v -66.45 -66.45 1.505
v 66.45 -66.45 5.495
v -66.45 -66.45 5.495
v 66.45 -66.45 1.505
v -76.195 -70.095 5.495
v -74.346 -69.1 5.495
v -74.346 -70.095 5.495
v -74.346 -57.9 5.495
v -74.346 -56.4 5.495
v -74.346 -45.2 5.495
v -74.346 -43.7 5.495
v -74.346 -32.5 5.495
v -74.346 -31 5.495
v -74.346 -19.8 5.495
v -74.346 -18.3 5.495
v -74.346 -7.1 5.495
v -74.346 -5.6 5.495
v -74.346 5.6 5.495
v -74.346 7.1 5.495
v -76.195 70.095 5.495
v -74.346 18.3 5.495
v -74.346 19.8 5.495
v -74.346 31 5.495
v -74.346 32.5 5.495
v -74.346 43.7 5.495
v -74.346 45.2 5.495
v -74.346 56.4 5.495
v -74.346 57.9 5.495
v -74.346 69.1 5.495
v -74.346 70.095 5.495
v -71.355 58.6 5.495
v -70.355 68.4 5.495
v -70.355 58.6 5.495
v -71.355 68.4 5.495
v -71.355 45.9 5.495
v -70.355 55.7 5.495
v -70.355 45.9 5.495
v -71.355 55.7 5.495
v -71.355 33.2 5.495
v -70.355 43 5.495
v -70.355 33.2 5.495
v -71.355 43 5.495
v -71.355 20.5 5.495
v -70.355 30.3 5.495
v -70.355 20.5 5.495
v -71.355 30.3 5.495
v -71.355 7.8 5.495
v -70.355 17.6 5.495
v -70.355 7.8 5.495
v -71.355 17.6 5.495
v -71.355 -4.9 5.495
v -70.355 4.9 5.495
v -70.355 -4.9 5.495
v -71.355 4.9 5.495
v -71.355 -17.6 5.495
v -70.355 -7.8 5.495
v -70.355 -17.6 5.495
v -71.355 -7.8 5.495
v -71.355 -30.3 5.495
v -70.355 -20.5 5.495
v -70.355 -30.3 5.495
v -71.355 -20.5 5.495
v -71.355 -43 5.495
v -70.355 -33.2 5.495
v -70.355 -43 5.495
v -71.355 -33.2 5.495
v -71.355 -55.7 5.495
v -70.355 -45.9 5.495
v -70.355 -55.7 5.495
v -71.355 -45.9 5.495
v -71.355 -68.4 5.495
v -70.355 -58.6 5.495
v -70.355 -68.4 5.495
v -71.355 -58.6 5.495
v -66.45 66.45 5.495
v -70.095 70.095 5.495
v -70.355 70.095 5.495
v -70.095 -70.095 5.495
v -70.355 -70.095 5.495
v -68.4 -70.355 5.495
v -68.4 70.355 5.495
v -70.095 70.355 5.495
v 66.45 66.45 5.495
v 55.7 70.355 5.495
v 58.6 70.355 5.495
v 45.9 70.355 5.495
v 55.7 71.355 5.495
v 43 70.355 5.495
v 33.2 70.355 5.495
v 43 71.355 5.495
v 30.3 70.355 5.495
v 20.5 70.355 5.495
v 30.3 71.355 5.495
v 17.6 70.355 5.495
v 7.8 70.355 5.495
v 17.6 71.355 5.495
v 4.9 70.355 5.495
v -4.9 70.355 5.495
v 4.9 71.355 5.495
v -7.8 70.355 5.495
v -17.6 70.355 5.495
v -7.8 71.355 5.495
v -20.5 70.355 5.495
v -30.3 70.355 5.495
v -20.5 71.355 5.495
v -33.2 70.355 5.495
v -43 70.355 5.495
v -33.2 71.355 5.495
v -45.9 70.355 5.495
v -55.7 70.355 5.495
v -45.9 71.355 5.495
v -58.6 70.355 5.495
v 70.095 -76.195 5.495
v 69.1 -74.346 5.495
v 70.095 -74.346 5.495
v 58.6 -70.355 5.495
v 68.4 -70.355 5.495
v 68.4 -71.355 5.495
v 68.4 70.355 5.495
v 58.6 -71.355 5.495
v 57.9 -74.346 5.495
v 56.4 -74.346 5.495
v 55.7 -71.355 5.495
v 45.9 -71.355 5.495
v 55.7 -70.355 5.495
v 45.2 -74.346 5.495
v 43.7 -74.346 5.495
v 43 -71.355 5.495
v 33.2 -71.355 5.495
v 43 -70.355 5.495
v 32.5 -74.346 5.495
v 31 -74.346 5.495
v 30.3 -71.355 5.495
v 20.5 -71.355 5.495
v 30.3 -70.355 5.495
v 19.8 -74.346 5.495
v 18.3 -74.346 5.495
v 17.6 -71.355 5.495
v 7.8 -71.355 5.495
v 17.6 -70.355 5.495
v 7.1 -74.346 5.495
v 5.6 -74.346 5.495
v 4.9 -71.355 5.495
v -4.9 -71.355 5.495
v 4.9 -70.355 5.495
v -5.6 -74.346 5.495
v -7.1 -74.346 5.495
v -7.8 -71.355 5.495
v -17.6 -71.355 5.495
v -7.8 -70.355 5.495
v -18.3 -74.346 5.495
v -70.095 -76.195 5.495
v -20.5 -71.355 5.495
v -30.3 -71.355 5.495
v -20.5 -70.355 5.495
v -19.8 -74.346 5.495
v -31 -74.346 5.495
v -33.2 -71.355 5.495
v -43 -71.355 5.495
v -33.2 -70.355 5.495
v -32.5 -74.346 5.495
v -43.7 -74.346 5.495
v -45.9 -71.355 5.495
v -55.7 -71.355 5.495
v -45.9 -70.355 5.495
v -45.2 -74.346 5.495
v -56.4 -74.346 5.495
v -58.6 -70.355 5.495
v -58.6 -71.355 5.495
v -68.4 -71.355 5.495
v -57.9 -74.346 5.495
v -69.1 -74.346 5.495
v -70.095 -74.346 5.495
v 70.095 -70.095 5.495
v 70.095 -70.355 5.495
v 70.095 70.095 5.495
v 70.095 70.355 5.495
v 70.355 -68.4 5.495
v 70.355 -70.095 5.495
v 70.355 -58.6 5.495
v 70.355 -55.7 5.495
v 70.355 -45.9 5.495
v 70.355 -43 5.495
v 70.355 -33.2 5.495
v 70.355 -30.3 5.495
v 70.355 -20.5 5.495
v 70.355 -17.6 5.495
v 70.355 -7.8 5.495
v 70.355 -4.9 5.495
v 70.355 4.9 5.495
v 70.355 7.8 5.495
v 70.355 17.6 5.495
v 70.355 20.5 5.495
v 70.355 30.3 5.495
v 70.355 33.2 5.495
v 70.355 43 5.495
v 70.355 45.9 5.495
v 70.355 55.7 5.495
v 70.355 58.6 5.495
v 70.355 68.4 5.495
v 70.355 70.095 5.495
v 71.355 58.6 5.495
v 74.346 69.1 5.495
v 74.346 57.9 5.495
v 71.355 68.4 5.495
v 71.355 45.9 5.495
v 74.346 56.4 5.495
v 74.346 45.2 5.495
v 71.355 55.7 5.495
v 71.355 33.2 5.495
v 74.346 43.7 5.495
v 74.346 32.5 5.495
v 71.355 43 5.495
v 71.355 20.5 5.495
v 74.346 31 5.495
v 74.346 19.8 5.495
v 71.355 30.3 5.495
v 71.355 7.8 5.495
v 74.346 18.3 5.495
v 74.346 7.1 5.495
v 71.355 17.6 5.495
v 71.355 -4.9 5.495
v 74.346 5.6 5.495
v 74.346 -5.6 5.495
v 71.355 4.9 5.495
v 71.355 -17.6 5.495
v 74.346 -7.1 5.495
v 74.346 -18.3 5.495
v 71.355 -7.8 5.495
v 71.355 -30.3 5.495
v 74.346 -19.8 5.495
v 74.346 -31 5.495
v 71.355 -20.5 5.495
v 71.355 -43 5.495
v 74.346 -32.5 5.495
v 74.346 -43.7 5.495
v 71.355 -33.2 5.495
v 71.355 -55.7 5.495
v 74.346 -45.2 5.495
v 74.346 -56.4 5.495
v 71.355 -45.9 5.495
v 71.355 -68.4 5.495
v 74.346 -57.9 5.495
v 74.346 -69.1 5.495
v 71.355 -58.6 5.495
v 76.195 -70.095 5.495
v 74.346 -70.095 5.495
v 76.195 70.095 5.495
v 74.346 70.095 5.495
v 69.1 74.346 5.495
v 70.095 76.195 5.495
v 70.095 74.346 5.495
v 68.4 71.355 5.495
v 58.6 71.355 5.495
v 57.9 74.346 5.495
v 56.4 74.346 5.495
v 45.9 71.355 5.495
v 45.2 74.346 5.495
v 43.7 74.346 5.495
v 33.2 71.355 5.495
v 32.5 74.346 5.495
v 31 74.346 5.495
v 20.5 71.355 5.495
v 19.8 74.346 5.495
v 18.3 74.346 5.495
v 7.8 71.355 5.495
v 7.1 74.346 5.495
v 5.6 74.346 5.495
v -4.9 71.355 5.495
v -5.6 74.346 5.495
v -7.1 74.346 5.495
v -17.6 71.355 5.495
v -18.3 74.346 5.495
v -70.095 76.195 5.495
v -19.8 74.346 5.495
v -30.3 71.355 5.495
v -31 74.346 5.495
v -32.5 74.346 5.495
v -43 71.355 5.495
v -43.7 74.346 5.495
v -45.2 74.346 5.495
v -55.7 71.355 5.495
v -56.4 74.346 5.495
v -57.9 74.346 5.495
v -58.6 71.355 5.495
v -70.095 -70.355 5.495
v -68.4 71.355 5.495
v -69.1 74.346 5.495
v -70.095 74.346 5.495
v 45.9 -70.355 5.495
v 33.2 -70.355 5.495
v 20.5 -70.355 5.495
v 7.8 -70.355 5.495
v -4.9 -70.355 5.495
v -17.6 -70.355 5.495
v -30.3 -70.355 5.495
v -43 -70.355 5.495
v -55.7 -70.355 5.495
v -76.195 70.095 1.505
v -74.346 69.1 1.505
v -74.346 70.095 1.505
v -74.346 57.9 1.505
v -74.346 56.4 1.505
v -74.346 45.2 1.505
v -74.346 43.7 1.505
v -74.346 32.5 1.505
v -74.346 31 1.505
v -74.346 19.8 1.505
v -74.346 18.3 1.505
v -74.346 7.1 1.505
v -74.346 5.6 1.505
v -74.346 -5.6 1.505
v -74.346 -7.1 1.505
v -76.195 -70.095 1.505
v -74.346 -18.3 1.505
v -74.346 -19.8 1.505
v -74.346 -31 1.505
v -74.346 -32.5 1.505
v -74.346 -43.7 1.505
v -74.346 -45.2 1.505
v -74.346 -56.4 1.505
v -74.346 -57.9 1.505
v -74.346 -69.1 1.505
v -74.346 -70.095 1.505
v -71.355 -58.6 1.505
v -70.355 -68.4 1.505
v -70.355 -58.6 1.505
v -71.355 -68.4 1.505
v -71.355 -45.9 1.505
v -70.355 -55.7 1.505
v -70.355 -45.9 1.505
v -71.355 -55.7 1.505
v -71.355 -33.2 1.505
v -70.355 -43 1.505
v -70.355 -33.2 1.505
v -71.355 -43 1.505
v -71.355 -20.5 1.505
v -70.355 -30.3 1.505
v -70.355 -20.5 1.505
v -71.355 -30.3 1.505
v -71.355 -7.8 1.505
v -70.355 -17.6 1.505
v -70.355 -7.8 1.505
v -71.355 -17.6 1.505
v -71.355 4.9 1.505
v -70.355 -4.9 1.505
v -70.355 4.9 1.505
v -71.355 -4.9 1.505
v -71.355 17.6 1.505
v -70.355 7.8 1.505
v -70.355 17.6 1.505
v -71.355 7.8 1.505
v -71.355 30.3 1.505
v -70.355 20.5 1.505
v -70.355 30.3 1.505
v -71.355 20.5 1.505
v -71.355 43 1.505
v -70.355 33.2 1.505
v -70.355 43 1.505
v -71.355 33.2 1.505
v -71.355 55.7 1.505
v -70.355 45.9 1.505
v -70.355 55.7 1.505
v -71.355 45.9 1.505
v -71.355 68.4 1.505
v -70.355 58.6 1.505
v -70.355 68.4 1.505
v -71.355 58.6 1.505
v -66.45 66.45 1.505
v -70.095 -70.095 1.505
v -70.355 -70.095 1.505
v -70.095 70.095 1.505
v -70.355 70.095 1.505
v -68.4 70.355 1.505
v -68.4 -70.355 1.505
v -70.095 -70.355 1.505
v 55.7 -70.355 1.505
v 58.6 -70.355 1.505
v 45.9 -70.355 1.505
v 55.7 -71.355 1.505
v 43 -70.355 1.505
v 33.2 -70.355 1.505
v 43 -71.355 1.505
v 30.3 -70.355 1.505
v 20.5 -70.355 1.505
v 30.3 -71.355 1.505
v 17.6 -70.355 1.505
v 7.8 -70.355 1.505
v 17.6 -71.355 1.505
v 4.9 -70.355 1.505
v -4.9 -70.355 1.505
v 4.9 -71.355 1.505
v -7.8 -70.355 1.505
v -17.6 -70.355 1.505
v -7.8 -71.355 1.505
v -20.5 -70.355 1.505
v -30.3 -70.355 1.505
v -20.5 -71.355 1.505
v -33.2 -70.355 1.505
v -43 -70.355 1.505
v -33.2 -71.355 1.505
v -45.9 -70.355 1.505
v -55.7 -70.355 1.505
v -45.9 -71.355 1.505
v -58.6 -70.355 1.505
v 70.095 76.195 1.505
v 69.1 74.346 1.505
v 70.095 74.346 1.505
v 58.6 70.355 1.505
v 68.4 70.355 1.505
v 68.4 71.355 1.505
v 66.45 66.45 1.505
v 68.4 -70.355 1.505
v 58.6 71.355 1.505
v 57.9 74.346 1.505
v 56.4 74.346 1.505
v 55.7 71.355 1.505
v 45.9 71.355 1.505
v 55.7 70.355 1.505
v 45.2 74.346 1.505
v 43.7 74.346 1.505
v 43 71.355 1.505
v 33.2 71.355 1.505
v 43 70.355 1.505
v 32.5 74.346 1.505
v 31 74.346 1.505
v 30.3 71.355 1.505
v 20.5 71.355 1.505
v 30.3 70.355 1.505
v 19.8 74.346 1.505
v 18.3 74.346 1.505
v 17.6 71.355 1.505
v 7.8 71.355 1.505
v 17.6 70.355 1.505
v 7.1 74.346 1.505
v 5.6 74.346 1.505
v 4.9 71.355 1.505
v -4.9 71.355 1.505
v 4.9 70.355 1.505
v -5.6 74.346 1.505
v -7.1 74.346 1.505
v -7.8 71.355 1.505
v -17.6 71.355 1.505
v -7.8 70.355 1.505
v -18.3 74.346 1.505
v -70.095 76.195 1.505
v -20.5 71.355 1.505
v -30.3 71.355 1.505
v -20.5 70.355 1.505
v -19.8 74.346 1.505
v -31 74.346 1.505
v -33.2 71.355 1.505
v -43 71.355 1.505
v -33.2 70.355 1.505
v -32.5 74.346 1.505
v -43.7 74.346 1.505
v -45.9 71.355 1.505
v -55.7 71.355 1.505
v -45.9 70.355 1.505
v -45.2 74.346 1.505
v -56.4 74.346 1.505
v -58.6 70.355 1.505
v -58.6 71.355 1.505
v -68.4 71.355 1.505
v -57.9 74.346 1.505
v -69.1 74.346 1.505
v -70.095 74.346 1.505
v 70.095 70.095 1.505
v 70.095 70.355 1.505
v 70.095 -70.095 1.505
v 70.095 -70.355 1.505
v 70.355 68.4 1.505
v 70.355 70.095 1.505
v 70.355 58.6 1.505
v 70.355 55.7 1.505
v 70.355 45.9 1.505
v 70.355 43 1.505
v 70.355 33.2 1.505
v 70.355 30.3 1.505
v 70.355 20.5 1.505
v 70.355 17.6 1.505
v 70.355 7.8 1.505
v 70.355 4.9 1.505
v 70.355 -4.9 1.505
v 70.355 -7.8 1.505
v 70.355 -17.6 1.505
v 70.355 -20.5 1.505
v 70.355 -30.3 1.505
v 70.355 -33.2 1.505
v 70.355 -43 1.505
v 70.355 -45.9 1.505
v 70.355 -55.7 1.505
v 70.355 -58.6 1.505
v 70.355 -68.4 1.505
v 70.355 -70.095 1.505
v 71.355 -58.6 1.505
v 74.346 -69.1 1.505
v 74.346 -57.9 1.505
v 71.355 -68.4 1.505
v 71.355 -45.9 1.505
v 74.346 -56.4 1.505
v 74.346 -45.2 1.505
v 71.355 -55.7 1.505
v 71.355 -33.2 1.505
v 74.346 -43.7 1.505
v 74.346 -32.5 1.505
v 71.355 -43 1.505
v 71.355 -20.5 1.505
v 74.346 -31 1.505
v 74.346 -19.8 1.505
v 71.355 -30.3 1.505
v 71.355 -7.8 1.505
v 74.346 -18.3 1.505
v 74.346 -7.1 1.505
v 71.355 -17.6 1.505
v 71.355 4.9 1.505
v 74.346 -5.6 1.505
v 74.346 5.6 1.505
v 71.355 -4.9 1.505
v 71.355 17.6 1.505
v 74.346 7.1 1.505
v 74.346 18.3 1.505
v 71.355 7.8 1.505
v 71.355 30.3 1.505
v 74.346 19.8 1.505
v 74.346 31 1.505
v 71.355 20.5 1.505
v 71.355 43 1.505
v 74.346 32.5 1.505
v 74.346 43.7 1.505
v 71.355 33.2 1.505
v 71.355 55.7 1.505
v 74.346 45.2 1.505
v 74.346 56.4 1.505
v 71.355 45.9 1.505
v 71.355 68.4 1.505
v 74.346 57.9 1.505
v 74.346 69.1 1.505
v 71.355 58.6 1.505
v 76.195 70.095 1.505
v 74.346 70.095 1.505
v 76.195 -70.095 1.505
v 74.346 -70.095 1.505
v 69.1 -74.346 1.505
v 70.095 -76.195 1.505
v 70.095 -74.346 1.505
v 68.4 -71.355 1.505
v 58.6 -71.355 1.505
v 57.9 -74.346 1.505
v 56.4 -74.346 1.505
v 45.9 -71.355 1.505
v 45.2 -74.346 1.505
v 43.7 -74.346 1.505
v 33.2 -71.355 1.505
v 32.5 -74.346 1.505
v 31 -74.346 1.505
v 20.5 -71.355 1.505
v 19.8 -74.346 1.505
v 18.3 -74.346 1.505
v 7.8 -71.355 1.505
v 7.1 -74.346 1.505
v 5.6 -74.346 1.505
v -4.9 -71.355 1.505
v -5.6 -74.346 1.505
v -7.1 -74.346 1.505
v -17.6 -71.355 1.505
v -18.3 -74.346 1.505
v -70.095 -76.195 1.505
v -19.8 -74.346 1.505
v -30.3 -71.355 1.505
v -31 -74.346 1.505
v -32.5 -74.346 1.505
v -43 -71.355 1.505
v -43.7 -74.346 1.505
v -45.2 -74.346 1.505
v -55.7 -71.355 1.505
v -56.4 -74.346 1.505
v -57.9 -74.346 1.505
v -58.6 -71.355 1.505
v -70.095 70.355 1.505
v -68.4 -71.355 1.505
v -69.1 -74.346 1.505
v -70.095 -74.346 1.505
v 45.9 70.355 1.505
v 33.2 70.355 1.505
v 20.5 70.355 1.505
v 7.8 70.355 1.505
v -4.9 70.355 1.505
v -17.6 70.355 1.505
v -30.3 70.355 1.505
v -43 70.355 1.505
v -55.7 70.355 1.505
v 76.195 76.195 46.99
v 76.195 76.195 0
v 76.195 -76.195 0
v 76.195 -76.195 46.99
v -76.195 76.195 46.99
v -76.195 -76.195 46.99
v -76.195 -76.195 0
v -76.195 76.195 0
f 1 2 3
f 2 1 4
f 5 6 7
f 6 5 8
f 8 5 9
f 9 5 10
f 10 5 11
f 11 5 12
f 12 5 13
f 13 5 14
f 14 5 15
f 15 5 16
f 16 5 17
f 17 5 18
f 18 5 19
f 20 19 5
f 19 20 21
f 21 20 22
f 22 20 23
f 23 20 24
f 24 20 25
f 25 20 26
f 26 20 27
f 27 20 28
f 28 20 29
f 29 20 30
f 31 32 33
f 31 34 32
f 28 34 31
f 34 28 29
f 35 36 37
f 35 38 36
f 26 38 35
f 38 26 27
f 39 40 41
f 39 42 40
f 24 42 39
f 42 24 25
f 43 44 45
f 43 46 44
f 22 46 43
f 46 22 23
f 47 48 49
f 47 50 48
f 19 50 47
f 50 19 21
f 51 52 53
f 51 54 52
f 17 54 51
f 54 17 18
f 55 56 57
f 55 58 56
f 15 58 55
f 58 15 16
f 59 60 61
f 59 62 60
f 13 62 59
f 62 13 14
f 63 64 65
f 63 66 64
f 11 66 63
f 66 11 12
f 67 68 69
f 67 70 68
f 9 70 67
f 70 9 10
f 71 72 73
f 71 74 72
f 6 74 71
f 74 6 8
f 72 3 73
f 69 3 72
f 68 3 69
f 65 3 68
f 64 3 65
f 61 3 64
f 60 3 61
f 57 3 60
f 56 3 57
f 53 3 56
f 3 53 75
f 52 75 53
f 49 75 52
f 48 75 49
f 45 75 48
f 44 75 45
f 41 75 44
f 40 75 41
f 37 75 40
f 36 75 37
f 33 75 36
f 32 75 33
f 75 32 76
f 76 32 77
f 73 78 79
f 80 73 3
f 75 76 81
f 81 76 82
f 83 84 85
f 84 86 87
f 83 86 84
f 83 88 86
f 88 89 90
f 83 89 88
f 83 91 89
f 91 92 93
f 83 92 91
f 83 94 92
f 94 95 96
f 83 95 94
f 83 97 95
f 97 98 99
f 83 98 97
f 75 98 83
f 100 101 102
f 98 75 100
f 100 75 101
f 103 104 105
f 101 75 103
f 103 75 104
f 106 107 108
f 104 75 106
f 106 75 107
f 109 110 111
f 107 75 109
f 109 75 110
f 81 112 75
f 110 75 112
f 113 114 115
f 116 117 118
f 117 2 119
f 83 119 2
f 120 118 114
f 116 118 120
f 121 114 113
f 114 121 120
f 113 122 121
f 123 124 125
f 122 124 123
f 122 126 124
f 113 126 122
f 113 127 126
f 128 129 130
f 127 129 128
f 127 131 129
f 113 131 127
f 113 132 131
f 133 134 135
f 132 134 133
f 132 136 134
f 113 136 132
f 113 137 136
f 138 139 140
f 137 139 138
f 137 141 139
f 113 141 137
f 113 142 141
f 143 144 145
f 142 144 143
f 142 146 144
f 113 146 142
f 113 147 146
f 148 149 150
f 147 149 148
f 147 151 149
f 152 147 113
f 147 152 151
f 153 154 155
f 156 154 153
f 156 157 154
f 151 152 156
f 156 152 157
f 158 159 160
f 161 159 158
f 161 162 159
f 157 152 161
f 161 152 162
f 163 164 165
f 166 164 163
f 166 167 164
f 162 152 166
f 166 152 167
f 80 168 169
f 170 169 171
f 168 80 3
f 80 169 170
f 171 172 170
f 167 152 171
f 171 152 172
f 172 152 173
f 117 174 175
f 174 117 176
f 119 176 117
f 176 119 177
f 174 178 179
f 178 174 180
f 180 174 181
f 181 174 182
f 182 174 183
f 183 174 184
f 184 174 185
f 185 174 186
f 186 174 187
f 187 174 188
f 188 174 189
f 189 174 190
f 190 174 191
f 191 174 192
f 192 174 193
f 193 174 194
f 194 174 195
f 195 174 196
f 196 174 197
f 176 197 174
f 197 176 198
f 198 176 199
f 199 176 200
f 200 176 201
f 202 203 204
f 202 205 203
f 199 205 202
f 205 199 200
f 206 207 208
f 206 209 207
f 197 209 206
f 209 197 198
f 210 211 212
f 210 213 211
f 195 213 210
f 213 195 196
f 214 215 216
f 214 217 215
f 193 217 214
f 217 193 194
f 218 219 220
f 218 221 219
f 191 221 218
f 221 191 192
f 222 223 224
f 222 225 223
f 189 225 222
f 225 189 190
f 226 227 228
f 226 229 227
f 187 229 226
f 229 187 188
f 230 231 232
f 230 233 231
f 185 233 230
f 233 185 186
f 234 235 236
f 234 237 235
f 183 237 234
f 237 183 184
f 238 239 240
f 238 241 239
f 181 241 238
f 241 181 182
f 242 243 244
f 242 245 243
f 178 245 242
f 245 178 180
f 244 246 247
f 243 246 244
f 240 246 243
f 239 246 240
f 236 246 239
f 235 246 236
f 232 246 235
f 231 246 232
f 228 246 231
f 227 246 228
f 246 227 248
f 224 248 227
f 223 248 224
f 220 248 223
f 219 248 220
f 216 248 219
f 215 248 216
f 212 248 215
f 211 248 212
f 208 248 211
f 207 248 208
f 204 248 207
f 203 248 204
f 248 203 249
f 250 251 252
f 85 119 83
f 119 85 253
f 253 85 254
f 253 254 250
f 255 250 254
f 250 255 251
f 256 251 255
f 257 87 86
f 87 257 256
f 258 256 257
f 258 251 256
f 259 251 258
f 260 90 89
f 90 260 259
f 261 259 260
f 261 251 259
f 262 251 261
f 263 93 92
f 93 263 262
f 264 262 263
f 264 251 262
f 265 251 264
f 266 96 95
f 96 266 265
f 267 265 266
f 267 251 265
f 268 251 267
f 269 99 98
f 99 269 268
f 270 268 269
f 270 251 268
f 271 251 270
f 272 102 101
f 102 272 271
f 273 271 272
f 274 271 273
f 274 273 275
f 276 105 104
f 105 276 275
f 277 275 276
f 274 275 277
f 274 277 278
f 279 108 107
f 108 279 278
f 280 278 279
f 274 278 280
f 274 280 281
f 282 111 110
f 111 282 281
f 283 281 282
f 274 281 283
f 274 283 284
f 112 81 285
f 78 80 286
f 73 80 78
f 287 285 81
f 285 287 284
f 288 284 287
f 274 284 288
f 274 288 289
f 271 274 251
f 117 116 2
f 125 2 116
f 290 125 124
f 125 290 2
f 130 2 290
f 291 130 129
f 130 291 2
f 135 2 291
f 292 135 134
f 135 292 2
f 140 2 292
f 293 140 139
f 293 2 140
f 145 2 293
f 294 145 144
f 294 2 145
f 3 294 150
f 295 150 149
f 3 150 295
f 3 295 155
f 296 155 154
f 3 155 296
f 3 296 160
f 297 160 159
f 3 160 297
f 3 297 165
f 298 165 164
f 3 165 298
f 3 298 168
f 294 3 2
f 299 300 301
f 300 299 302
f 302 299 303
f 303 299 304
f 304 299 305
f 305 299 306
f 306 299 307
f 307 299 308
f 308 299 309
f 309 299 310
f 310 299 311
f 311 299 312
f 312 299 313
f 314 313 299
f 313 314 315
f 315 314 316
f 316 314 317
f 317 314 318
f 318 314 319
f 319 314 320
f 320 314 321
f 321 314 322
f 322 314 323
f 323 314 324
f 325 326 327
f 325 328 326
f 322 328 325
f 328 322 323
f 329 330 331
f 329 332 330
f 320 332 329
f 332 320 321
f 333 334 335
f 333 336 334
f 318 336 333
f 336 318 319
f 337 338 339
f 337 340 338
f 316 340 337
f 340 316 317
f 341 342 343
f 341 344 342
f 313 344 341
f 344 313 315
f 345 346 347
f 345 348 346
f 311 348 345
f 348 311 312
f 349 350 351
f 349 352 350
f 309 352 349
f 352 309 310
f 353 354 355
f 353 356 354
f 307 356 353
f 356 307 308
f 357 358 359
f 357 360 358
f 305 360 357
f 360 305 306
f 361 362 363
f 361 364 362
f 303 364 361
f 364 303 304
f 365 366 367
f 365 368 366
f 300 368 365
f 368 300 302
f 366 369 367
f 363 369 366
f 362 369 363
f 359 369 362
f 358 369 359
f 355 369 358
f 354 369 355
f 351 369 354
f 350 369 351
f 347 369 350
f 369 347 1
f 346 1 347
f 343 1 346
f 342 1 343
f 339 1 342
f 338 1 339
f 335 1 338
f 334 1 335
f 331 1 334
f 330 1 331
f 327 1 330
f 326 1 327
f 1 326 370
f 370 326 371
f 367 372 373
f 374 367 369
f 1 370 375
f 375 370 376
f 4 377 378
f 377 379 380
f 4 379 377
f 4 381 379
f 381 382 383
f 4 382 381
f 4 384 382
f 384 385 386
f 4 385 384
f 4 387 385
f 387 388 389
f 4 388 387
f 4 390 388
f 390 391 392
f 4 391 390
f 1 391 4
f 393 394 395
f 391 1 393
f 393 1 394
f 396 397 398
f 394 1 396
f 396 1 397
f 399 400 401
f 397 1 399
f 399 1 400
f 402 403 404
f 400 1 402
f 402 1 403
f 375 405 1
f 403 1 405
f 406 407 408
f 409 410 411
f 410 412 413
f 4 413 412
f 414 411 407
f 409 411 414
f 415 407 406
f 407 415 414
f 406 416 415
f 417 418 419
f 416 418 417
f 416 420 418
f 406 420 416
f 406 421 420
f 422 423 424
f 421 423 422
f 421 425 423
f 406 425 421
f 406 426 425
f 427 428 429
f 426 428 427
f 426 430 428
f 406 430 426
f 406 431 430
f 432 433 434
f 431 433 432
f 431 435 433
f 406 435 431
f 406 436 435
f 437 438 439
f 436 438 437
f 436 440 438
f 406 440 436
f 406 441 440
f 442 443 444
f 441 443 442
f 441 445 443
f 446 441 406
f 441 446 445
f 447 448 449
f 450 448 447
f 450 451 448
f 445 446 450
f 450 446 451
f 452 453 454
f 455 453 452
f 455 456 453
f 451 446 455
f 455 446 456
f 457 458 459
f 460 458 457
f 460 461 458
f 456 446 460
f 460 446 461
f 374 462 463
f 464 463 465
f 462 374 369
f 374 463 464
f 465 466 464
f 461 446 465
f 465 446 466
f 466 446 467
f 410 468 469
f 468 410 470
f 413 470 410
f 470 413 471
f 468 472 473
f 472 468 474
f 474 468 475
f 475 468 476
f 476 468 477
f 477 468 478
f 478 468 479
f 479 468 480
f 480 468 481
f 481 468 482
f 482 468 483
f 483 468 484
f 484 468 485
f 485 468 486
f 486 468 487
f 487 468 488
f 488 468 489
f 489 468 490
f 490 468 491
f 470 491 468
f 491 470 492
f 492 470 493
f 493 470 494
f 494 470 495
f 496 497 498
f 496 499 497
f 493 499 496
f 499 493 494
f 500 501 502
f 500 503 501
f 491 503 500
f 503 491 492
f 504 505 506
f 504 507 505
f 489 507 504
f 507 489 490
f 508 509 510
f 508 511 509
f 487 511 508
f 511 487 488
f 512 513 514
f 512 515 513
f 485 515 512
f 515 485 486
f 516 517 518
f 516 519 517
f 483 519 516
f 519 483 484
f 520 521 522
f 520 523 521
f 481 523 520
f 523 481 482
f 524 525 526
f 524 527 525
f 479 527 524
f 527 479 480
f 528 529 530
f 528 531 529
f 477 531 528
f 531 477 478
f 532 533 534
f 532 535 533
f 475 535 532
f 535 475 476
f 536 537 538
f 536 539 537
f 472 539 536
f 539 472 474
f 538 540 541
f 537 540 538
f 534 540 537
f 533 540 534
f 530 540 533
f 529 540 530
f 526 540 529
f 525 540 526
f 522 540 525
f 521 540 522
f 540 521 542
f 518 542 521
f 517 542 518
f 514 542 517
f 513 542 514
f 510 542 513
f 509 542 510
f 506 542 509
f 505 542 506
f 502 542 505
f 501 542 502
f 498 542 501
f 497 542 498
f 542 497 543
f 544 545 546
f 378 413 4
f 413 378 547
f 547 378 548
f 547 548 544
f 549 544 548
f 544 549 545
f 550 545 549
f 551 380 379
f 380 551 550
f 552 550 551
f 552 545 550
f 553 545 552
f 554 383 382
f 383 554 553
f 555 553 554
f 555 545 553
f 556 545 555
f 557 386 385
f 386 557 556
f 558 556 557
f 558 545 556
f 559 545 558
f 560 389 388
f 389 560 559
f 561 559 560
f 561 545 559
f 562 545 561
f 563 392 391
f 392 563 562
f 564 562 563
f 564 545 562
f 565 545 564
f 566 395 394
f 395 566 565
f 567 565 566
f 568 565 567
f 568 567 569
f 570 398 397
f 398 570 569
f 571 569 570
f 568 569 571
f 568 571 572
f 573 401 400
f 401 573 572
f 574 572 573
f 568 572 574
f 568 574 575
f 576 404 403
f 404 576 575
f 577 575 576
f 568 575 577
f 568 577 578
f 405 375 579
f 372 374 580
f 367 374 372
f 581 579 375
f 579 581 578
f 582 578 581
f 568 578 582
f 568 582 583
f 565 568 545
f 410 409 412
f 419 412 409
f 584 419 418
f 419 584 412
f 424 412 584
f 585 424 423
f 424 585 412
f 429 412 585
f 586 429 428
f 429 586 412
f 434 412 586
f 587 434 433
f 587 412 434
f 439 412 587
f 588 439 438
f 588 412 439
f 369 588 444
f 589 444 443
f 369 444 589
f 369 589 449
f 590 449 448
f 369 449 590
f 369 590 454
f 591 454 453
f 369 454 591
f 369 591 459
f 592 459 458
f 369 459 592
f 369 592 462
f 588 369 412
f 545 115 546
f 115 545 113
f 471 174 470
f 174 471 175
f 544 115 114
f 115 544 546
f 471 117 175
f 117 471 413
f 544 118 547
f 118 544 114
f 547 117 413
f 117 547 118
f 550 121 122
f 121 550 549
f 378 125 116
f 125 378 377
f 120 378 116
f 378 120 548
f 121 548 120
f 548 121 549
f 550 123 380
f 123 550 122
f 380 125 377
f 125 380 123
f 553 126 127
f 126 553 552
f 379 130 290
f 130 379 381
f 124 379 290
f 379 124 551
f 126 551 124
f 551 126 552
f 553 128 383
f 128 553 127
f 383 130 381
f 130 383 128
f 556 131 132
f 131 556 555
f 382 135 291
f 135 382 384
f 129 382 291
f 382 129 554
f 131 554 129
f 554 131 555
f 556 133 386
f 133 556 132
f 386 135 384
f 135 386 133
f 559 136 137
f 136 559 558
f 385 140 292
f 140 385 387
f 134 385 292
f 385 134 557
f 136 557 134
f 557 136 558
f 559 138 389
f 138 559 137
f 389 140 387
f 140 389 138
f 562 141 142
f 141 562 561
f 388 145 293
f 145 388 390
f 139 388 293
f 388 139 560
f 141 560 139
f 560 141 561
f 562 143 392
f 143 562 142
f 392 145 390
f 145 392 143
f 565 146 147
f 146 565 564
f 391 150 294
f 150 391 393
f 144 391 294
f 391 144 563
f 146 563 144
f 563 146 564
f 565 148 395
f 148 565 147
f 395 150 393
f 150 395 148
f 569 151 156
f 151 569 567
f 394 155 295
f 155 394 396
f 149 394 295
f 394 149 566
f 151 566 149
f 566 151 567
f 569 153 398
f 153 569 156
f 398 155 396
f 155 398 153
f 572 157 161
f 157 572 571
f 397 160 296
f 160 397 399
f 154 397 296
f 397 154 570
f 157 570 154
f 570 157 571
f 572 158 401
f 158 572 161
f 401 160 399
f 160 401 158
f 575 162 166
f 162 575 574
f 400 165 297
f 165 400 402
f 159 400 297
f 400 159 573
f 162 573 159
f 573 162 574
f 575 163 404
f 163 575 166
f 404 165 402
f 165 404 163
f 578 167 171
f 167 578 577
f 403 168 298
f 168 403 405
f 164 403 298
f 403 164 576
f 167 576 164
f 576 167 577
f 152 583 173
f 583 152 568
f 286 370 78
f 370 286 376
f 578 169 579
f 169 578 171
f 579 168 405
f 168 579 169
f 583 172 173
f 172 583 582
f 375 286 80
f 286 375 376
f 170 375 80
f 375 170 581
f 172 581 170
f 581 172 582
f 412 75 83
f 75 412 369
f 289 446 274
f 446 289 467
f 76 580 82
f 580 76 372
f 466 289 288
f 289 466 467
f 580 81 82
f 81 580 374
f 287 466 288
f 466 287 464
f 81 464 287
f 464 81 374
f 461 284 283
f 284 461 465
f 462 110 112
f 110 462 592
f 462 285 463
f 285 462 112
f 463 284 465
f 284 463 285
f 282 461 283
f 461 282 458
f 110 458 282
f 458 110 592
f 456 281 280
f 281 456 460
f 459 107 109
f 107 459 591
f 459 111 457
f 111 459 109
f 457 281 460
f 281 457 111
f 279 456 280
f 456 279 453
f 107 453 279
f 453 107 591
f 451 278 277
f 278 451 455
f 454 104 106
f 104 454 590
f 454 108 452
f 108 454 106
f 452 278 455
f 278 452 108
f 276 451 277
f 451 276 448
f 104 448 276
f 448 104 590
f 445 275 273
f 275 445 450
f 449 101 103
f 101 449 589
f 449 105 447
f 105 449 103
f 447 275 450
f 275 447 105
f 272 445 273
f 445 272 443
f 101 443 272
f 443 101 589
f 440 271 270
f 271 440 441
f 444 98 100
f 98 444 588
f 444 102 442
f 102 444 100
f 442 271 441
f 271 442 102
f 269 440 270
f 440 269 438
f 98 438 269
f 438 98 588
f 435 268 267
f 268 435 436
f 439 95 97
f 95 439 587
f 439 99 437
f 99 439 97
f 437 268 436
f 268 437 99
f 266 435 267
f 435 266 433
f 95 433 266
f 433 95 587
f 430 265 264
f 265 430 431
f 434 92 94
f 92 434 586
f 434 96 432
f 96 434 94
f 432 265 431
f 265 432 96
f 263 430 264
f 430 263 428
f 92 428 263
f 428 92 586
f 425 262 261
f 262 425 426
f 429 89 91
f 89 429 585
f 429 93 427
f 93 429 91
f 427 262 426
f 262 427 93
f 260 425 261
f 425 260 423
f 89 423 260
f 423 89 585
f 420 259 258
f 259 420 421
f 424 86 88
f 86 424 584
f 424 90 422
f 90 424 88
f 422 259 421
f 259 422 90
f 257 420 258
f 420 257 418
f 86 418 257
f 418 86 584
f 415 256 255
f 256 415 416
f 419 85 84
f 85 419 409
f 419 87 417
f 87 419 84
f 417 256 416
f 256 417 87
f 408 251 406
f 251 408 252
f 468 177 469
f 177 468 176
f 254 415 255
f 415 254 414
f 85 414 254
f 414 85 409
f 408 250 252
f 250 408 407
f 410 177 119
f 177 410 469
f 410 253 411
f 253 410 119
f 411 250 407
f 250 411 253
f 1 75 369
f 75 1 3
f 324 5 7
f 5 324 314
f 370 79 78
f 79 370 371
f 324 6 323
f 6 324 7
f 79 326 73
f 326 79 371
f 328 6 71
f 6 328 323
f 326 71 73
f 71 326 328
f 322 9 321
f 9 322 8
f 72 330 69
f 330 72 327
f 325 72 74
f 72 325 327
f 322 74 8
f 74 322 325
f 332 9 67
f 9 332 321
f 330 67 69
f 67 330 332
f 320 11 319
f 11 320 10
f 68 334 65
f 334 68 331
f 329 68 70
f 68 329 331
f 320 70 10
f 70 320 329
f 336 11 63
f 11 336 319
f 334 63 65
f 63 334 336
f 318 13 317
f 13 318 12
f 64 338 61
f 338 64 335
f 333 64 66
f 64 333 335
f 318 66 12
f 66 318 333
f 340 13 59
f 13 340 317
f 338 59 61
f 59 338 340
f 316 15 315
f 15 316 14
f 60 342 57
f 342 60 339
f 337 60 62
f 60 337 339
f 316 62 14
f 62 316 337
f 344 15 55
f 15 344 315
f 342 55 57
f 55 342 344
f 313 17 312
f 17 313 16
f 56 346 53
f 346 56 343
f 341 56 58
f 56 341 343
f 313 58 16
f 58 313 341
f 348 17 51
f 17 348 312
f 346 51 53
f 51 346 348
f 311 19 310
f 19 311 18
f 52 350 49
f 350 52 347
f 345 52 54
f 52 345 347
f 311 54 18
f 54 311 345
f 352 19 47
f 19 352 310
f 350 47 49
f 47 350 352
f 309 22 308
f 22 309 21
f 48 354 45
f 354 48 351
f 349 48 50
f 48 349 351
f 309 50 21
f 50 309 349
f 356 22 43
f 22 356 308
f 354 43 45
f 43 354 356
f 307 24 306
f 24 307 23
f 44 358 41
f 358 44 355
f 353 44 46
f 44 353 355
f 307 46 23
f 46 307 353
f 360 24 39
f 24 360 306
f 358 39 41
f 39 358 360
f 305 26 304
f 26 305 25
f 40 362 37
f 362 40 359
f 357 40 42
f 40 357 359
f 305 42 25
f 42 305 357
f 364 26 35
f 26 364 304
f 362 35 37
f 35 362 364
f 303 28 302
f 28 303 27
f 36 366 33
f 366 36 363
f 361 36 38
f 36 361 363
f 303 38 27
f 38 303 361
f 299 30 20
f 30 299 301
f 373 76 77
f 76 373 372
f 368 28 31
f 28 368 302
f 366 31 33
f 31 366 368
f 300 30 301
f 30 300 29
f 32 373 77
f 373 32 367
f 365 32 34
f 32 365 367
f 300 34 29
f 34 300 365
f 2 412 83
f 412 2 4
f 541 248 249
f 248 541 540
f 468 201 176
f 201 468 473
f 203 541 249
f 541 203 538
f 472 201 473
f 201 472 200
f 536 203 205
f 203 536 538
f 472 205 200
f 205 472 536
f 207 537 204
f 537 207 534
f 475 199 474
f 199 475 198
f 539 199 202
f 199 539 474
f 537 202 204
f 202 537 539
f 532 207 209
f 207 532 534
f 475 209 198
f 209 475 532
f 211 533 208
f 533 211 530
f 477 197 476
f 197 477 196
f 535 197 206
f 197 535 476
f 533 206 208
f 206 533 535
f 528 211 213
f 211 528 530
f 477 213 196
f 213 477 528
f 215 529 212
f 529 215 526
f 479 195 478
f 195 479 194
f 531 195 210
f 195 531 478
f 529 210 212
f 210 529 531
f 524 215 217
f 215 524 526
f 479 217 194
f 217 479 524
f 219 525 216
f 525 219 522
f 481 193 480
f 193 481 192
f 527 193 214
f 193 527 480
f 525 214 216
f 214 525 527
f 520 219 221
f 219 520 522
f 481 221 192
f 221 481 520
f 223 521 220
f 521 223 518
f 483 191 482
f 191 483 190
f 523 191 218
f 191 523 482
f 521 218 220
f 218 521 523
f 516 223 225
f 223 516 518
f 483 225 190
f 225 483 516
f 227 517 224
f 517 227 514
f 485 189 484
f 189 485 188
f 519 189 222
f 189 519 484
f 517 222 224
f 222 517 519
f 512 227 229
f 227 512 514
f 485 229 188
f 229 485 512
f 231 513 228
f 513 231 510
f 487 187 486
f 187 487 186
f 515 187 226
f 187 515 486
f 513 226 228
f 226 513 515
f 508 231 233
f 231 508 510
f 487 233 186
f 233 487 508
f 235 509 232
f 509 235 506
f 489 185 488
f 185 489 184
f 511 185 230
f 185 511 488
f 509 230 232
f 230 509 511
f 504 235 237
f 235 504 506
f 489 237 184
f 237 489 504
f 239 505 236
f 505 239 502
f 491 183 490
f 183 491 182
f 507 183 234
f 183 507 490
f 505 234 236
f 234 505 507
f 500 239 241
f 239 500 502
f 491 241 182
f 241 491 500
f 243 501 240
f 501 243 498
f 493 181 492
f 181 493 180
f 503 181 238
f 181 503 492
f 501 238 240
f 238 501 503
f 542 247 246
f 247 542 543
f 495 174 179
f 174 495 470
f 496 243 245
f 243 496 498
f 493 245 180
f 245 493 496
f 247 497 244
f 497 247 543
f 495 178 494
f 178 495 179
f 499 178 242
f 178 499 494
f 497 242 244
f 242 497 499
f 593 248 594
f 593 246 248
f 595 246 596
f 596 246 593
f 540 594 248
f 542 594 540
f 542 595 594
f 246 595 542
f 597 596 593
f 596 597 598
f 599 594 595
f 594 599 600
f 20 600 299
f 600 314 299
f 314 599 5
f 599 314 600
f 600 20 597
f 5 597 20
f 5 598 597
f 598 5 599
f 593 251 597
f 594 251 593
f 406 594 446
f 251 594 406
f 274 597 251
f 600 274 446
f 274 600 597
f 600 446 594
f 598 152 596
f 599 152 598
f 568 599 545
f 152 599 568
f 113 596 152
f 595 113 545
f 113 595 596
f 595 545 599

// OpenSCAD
// file: openlock_port.scad
include <consts.scad>

module port() {
    // all units are in mm (yes, this is a *special* case for this project)
    depth = 4;
    width = 9.75;
    collar_width = 1.8545;
    collar_indent = 1;
    height = 13.2;
    notch_width = 5.8445;
    notch_height = 9.80;
    notch_offset = (height - notch_height) / 2;
    notch_rest = 1;
    // offset hack - adds tolerance for preview/render
    eps = 0.01;
    eps_half = eps / 2;
    
    translate([0, -height / 2, -depth / 2])
        difference() {
            translate([0, eps_half, eps_half])
                cube([width, height - eps, depth - eps]);
            linear_extrude(depth)
                polygon([
                    [collar_width, 0],
                    [collar_width, collar_indent],
                    [notch_width - notch_rest, notch_offset],
                    [notch_width, notch_offset],
                    [notch_width, 0]
                ]);
            linear_extrude(depth)
                polygon([
                    [collar_width, height],
                    [collar_width, height - collar_indent],
                    [notch_width - notch_rest, height - notch_offset],
                    [notch_width, height - notch_offset],
                    [notch_width, height]
                ]);
        }
}

// yeah... units are in inches, unless suffixed with `_mm`...
module openlock_rectangle(width, height, extrude_mm, sparse=false) {
    width_mm = inches_to_mm(width);
    height_mm = inches_to_mm(height);
    full_inch_mm = inches_to_mm(1);
    half_inch_mm = inches_to_mm(0.5);
    spacing = sparse ? full_inch_mm : half_inch_mm;
    // offset hack - adds tolerance for preview/render
    eps = 0.01;
    eps_half = eps / 2;

    difference() {
        translate([-width_mm / 2 + eps_half, -height_mm / 2 + eps_half, 0]) {
            cube([
                width_mm - eps,
                height_mm - eps,
                openlock_edge_extrude_mm + extrude_mm - eps
            ]);
        }

        // x
        for(angle = [90, 270]) {
            for(offset = [spacing : spacing: width_mm - half_inch_mm]) {
                rotate(angle)
                translate([-height_mm / 2, -width_mm / 2 + offset, openlock_edge_extrude_mid_mm]) {
                    port();
                }
            }
        }
        
        // y
        for(angle = [0, 180]) {
            for(offset = [spacing : spacing : height_mm - half_inch_mm]) {
                rotate(angle)
                translate([-width_mm / 2, -height_mm / 2 + offset, openlock_edge_extrude_mid_mm]) {
                    port();
                }
            }
        }
    }
}

module openlock_square(width, extrude_mm, sparse=false) {
    openlock_rectangle(width, width, extrude_mm, sparse);
}

// test
//port();
// file: consts.scad
mm_in_inch = 25.399999619;

function inches_to_mm(inches) = mm_in_inch * inches;
function mm_to_inches(mm) = mm / mm_in_inch;

// yeah... units are in inches, unless suffixed with `_mm`...
trench_width = 2.5;
template_width = 6;

trench_height_mm = 40;

template_width_mm = inches_to_mm(template_width);

// measured some of the official terrain, but not all of them - might need to adjust it...
30_deg_in_width_mm = 17;
30_deg_out_width_mm = 15.20;
60_deg_in_width_mm = 18.10;
60_deg_out_width_mm = 27.10;

openlock_edge_extrude_mm = 7;
openlock_edge_extrude_mid_mm = openlock_edge_extrude_mm / 2;

system_openlock = "openlock";
system_openlock_sparse = "openlock_sparse";
// main file
include <consts.scad>
use <openlock_port.scad>

module template_base(system=system_openlock) {
    difference() {
        if(system==system_openlock)
            openlock_square(template_width, trench_height_mm);
        if(system==system_openlock_sparse)
            openlock_square(template_width, trench_height_mm, true);
        
        translate([0, 0, openlock_edge_extrude_mm])
            linear_extrude(trench_height_mm)
                children();
    }
}

module center_template() {
    template_width_half_mm = template_width_mm / 2;
    
    translate([-template_width_half_mm, -template_width_half_mm, 0])
        children();
}

module center_polygon(points) {
    center_template()
        polygon(points * mm_in_inch);
}

module center_polygon_grid(points, coords) {
    translate([
        -coords[0] * template_width_mm,
        -coords[1] * template_width_mm
    ])
        center_polygon(points);
}

module template_polygon_grid(points, coords, system=system_openlock) {
    template_base(system)
        center_polygon_grid(points, coords);
}

module template_polygon(points, system) {
    template_polygon_grid(points, [0, 0], system);
}

module indent() {
    edge_offset = (template_width - trench_width) / 2;
    
    center_polygon([
        [edge_offset, 0],
        [template_width - edge_offset, 0],
        [template_width - edge_offset, template_width - edge_offset],
        [edge_offset, template_width - edge_offset],
    ]);
}

module template_indents(angles, system=system_openlock) {
    template_base(system)
        for(angle = angles)
            rotate(angle)
                indent();
}

// test
template_base();
